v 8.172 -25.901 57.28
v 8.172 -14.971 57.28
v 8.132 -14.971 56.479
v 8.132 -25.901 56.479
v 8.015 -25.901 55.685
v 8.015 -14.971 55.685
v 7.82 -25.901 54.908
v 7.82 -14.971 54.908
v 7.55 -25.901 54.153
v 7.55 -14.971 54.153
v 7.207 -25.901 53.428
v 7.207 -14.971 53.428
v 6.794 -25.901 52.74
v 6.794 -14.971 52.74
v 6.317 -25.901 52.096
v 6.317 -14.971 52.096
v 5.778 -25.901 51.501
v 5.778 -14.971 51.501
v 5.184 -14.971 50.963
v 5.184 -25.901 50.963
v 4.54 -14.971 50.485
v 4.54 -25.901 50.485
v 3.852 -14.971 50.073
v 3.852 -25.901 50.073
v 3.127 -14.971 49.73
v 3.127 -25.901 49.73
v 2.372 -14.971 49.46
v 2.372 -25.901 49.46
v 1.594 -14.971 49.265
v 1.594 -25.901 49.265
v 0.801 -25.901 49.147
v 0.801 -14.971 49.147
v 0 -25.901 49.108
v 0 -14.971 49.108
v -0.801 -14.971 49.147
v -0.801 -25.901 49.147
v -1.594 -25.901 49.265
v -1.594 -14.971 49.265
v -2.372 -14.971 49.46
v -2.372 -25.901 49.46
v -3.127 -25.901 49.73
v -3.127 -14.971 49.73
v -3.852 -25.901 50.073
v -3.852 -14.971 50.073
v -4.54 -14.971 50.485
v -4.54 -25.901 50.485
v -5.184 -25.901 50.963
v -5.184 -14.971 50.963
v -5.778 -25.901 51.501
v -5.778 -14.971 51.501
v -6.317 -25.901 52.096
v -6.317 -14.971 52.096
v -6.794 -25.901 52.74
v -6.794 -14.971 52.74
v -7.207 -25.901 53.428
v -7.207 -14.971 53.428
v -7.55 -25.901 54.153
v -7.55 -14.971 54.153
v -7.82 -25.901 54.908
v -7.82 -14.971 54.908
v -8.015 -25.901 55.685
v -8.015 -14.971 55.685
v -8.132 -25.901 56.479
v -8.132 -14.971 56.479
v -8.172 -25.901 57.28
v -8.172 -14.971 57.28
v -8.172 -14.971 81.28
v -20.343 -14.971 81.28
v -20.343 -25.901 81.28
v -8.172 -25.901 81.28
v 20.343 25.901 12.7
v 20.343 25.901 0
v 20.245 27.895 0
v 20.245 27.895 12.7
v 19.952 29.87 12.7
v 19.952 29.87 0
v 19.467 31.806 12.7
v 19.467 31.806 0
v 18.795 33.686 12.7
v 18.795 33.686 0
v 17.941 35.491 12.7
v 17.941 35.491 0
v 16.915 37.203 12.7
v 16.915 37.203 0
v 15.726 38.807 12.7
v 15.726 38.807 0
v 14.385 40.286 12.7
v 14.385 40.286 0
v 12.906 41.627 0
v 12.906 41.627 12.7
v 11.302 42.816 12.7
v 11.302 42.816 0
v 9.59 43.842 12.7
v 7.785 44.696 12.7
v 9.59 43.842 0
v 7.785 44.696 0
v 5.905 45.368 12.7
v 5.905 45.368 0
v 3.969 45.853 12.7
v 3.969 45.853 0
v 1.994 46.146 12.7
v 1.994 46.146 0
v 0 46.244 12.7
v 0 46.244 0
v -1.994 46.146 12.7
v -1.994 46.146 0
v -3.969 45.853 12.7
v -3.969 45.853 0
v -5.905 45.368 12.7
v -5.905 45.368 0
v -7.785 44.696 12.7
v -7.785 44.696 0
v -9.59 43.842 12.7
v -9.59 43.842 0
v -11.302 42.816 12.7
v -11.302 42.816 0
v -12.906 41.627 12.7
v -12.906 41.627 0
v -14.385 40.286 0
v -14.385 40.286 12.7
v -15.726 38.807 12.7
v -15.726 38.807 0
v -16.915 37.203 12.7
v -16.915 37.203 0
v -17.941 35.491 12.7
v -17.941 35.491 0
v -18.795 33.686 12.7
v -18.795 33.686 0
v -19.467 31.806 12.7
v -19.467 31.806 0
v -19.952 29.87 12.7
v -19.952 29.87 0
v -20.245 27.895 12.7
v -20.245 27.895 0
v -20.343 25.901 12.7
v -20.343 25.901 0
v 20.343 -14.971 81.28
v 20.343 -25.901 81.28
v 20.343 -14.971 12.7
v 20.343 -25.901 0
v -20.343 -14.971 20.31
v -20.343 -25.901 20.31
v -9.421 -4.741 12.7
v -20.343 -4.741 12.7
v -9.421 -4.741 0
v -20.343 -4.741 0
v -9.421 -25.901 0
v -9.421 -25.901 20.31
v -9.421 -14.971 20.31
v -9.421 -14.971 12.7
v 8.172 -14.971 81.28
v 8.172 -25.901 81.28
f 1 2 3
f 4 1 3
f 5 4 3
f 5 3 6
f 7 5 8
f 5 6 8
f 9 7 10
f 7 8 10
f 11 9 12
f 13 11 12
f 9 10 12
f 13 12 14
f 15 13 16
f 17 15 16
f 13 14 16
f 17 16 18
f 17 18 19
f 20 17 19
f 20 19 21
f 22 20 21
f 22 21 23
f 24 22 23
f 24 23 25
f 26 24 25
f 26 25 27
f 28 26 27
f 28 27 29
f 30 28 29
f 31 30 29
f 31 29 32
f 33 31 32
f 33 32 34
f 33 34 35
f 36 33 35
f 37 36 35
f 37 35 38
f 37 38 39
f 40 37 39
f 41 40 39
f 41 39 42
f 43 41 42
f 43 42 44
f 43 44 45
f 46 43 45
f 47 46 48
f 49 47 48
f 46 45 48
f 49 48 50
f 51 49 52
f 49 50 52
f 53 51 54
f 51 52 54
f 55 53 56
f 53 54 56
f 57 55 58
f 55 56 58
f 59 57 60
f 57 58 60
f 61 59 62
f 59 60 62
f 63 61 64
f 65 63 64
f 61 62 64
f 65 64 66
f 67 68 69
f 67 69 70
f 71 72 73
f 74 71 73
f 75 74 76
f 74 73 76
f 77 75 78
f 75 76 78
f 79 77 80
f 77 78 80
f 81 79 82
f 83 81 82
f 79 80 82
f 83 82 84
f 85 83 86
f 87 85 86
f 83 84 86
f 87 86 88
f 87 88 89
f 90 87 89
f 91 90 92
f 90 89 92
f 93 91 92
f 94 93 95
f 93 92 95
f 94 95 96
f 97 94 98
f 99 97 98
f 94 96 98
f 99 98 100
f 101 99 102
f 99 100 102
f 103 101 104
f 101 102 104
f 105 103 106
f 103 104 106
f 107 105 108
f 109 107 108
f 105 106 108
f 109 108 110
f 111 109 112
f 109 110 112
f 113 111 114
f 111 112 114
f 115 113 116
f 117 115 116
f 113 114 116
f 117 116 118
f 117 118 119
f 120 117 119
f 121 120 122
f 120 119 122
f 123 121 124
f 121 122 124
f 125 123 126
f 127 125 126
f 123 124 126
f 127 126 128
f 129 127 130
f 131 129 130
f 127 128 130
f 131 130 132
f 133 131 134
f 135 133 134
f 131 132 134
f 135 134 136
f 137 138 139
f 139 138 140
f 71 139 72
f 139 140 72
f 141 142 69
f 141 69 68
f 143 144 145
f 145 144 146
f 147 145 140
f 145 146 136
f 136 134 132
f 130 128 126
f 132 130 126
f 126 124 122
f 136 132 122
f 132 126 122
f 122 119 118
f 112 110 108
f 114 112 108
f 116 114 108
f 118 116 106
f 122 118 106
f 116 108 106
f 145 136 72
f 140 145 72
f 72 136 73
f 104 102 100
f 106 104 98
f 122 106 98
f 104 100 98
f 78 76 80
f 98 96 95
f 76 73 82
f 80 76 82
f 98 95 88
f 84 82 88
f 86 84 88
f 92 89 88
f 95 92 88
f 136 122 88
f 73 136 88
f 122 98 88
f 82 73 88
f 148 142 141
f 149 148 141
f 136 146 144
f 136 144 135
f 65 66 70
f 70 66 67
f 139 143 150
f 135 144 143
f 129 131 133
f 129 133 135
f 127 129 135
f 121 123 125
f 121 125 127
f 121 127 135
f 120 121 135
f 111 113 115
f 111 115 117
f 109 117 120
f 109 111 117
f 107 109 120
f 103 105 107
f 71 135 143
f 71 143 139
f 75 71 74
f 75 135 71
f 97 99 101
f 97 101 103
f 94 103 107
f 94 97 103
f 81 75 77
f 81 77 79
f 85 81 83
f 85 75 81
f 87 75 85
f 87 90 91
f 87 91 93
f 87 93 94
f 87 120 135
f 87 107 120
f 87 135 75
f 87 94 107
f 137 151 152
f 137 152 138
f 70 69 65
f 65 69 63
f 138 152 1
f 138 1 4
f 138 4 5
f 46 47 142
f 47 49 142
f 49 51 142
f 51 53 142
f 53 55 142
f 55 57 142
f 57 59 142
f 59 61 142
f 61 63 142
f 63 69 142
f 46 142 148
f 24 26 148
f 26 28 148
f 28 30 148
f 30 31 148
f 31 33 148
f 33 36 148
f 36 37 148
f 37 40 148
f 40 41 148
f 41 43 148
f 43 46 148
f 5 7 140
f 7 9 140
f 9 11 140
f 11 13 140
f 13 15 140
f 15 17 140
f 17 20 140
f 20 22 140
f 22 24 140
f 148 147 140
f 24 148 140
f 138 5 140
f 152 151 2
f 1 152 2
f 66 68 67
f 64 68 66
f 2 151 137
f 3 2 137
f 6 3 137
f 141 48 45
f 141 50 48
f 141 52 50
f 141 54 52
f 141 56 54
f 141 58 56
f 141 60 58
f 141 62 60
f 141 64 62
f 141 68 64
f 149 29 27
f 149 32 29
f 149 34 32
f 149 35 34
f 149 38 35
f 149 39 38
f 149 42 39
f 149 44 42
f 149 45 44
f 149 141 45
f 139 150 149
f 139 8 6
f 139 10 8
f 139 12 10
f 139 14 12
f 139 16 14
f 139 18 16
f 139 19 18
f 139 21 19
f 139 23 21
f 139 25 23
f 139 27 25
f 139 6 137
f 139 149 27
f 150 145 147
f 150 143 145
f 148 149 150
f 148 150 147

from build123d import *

# Parameters (mm, degrees)
F1_DEPTH = 12.7
F2_W     = 40.6866073608
F2_H     = 10.9301833436
F3_DEPTH = 68.58
F5_DEPTH = 25.4
F7_DEPTH = 10.922


with BuildPart() as f1:
    # F0 (on Top) → F1 (new body)
    with BuildSketch(Plane.XY):
        with BuildLine():
            Line((-20.3433036804, -25.90101026), (20.3433036804, -25.90101026))
            Line((20.3433036804, -25.90101026), (20.3433036804, 25.90101026))
            ThreePointArc((20.3433036804, 25.90101026), (0, 46.2443139404), (-20.3433036804, 25.90101026))
            Line((-20.3433036804, 25.90101026), (-20.3433036804, -25.90101026))
        make_face()
    extrude(amount=F1_DEPTH)

    # F2 (on face) → F3 (join)
    with BuildSketch(Plane.XY.offset(12.7)):
        with Locations((0, -20.4359185882)):
            Rectangle(F2_W, F2_H)
    extrude(amount=F3_DEPTH)

    # F4 (on face) → F5 (cut)
    with BuildSketch(Plane(origin=(0, -14.9708269164, 0), x_dir=(-1, 0, 0), z_dir=(0, 1, 0))):
        with BuildLine():
            Line((8.1715718843, 81.28), (-8.1715718843, 81.28))
            Line((-8.1715718843, 81.28), (-8.1715718843, 57.2796314955))
            ThreePointArc((-8.1715718843, 57.2796314955), (0, 49.1080596112), (8.1715718843, 57.2796314955))
            Line((8.1715718843, 57.2796314955), (8.1715718843, 81.28))
        make_face()
    extrude(amount=-F5_DEPTH, mode=Mode.SUBTRACT)

    # F6 (on face) → F7 (cut)
    with BuildSketch(Plane(origin=(-20.3433036804, 0, 0), x_dir=(0, -1, 0), z_dir=(-1, 0, 0))):
        Polygon((4.7405310906, 0), (25.90101026, 0), (25.90101026, 20.310420543), (14.9708269164, 20.310420543), (14.9708269164, 12.7), (4.7405310906, 12.7), align=None)
    extrude(amount=-F7_DEPTH, mode=Mode.SUBTRACT)


solid = f1.part
